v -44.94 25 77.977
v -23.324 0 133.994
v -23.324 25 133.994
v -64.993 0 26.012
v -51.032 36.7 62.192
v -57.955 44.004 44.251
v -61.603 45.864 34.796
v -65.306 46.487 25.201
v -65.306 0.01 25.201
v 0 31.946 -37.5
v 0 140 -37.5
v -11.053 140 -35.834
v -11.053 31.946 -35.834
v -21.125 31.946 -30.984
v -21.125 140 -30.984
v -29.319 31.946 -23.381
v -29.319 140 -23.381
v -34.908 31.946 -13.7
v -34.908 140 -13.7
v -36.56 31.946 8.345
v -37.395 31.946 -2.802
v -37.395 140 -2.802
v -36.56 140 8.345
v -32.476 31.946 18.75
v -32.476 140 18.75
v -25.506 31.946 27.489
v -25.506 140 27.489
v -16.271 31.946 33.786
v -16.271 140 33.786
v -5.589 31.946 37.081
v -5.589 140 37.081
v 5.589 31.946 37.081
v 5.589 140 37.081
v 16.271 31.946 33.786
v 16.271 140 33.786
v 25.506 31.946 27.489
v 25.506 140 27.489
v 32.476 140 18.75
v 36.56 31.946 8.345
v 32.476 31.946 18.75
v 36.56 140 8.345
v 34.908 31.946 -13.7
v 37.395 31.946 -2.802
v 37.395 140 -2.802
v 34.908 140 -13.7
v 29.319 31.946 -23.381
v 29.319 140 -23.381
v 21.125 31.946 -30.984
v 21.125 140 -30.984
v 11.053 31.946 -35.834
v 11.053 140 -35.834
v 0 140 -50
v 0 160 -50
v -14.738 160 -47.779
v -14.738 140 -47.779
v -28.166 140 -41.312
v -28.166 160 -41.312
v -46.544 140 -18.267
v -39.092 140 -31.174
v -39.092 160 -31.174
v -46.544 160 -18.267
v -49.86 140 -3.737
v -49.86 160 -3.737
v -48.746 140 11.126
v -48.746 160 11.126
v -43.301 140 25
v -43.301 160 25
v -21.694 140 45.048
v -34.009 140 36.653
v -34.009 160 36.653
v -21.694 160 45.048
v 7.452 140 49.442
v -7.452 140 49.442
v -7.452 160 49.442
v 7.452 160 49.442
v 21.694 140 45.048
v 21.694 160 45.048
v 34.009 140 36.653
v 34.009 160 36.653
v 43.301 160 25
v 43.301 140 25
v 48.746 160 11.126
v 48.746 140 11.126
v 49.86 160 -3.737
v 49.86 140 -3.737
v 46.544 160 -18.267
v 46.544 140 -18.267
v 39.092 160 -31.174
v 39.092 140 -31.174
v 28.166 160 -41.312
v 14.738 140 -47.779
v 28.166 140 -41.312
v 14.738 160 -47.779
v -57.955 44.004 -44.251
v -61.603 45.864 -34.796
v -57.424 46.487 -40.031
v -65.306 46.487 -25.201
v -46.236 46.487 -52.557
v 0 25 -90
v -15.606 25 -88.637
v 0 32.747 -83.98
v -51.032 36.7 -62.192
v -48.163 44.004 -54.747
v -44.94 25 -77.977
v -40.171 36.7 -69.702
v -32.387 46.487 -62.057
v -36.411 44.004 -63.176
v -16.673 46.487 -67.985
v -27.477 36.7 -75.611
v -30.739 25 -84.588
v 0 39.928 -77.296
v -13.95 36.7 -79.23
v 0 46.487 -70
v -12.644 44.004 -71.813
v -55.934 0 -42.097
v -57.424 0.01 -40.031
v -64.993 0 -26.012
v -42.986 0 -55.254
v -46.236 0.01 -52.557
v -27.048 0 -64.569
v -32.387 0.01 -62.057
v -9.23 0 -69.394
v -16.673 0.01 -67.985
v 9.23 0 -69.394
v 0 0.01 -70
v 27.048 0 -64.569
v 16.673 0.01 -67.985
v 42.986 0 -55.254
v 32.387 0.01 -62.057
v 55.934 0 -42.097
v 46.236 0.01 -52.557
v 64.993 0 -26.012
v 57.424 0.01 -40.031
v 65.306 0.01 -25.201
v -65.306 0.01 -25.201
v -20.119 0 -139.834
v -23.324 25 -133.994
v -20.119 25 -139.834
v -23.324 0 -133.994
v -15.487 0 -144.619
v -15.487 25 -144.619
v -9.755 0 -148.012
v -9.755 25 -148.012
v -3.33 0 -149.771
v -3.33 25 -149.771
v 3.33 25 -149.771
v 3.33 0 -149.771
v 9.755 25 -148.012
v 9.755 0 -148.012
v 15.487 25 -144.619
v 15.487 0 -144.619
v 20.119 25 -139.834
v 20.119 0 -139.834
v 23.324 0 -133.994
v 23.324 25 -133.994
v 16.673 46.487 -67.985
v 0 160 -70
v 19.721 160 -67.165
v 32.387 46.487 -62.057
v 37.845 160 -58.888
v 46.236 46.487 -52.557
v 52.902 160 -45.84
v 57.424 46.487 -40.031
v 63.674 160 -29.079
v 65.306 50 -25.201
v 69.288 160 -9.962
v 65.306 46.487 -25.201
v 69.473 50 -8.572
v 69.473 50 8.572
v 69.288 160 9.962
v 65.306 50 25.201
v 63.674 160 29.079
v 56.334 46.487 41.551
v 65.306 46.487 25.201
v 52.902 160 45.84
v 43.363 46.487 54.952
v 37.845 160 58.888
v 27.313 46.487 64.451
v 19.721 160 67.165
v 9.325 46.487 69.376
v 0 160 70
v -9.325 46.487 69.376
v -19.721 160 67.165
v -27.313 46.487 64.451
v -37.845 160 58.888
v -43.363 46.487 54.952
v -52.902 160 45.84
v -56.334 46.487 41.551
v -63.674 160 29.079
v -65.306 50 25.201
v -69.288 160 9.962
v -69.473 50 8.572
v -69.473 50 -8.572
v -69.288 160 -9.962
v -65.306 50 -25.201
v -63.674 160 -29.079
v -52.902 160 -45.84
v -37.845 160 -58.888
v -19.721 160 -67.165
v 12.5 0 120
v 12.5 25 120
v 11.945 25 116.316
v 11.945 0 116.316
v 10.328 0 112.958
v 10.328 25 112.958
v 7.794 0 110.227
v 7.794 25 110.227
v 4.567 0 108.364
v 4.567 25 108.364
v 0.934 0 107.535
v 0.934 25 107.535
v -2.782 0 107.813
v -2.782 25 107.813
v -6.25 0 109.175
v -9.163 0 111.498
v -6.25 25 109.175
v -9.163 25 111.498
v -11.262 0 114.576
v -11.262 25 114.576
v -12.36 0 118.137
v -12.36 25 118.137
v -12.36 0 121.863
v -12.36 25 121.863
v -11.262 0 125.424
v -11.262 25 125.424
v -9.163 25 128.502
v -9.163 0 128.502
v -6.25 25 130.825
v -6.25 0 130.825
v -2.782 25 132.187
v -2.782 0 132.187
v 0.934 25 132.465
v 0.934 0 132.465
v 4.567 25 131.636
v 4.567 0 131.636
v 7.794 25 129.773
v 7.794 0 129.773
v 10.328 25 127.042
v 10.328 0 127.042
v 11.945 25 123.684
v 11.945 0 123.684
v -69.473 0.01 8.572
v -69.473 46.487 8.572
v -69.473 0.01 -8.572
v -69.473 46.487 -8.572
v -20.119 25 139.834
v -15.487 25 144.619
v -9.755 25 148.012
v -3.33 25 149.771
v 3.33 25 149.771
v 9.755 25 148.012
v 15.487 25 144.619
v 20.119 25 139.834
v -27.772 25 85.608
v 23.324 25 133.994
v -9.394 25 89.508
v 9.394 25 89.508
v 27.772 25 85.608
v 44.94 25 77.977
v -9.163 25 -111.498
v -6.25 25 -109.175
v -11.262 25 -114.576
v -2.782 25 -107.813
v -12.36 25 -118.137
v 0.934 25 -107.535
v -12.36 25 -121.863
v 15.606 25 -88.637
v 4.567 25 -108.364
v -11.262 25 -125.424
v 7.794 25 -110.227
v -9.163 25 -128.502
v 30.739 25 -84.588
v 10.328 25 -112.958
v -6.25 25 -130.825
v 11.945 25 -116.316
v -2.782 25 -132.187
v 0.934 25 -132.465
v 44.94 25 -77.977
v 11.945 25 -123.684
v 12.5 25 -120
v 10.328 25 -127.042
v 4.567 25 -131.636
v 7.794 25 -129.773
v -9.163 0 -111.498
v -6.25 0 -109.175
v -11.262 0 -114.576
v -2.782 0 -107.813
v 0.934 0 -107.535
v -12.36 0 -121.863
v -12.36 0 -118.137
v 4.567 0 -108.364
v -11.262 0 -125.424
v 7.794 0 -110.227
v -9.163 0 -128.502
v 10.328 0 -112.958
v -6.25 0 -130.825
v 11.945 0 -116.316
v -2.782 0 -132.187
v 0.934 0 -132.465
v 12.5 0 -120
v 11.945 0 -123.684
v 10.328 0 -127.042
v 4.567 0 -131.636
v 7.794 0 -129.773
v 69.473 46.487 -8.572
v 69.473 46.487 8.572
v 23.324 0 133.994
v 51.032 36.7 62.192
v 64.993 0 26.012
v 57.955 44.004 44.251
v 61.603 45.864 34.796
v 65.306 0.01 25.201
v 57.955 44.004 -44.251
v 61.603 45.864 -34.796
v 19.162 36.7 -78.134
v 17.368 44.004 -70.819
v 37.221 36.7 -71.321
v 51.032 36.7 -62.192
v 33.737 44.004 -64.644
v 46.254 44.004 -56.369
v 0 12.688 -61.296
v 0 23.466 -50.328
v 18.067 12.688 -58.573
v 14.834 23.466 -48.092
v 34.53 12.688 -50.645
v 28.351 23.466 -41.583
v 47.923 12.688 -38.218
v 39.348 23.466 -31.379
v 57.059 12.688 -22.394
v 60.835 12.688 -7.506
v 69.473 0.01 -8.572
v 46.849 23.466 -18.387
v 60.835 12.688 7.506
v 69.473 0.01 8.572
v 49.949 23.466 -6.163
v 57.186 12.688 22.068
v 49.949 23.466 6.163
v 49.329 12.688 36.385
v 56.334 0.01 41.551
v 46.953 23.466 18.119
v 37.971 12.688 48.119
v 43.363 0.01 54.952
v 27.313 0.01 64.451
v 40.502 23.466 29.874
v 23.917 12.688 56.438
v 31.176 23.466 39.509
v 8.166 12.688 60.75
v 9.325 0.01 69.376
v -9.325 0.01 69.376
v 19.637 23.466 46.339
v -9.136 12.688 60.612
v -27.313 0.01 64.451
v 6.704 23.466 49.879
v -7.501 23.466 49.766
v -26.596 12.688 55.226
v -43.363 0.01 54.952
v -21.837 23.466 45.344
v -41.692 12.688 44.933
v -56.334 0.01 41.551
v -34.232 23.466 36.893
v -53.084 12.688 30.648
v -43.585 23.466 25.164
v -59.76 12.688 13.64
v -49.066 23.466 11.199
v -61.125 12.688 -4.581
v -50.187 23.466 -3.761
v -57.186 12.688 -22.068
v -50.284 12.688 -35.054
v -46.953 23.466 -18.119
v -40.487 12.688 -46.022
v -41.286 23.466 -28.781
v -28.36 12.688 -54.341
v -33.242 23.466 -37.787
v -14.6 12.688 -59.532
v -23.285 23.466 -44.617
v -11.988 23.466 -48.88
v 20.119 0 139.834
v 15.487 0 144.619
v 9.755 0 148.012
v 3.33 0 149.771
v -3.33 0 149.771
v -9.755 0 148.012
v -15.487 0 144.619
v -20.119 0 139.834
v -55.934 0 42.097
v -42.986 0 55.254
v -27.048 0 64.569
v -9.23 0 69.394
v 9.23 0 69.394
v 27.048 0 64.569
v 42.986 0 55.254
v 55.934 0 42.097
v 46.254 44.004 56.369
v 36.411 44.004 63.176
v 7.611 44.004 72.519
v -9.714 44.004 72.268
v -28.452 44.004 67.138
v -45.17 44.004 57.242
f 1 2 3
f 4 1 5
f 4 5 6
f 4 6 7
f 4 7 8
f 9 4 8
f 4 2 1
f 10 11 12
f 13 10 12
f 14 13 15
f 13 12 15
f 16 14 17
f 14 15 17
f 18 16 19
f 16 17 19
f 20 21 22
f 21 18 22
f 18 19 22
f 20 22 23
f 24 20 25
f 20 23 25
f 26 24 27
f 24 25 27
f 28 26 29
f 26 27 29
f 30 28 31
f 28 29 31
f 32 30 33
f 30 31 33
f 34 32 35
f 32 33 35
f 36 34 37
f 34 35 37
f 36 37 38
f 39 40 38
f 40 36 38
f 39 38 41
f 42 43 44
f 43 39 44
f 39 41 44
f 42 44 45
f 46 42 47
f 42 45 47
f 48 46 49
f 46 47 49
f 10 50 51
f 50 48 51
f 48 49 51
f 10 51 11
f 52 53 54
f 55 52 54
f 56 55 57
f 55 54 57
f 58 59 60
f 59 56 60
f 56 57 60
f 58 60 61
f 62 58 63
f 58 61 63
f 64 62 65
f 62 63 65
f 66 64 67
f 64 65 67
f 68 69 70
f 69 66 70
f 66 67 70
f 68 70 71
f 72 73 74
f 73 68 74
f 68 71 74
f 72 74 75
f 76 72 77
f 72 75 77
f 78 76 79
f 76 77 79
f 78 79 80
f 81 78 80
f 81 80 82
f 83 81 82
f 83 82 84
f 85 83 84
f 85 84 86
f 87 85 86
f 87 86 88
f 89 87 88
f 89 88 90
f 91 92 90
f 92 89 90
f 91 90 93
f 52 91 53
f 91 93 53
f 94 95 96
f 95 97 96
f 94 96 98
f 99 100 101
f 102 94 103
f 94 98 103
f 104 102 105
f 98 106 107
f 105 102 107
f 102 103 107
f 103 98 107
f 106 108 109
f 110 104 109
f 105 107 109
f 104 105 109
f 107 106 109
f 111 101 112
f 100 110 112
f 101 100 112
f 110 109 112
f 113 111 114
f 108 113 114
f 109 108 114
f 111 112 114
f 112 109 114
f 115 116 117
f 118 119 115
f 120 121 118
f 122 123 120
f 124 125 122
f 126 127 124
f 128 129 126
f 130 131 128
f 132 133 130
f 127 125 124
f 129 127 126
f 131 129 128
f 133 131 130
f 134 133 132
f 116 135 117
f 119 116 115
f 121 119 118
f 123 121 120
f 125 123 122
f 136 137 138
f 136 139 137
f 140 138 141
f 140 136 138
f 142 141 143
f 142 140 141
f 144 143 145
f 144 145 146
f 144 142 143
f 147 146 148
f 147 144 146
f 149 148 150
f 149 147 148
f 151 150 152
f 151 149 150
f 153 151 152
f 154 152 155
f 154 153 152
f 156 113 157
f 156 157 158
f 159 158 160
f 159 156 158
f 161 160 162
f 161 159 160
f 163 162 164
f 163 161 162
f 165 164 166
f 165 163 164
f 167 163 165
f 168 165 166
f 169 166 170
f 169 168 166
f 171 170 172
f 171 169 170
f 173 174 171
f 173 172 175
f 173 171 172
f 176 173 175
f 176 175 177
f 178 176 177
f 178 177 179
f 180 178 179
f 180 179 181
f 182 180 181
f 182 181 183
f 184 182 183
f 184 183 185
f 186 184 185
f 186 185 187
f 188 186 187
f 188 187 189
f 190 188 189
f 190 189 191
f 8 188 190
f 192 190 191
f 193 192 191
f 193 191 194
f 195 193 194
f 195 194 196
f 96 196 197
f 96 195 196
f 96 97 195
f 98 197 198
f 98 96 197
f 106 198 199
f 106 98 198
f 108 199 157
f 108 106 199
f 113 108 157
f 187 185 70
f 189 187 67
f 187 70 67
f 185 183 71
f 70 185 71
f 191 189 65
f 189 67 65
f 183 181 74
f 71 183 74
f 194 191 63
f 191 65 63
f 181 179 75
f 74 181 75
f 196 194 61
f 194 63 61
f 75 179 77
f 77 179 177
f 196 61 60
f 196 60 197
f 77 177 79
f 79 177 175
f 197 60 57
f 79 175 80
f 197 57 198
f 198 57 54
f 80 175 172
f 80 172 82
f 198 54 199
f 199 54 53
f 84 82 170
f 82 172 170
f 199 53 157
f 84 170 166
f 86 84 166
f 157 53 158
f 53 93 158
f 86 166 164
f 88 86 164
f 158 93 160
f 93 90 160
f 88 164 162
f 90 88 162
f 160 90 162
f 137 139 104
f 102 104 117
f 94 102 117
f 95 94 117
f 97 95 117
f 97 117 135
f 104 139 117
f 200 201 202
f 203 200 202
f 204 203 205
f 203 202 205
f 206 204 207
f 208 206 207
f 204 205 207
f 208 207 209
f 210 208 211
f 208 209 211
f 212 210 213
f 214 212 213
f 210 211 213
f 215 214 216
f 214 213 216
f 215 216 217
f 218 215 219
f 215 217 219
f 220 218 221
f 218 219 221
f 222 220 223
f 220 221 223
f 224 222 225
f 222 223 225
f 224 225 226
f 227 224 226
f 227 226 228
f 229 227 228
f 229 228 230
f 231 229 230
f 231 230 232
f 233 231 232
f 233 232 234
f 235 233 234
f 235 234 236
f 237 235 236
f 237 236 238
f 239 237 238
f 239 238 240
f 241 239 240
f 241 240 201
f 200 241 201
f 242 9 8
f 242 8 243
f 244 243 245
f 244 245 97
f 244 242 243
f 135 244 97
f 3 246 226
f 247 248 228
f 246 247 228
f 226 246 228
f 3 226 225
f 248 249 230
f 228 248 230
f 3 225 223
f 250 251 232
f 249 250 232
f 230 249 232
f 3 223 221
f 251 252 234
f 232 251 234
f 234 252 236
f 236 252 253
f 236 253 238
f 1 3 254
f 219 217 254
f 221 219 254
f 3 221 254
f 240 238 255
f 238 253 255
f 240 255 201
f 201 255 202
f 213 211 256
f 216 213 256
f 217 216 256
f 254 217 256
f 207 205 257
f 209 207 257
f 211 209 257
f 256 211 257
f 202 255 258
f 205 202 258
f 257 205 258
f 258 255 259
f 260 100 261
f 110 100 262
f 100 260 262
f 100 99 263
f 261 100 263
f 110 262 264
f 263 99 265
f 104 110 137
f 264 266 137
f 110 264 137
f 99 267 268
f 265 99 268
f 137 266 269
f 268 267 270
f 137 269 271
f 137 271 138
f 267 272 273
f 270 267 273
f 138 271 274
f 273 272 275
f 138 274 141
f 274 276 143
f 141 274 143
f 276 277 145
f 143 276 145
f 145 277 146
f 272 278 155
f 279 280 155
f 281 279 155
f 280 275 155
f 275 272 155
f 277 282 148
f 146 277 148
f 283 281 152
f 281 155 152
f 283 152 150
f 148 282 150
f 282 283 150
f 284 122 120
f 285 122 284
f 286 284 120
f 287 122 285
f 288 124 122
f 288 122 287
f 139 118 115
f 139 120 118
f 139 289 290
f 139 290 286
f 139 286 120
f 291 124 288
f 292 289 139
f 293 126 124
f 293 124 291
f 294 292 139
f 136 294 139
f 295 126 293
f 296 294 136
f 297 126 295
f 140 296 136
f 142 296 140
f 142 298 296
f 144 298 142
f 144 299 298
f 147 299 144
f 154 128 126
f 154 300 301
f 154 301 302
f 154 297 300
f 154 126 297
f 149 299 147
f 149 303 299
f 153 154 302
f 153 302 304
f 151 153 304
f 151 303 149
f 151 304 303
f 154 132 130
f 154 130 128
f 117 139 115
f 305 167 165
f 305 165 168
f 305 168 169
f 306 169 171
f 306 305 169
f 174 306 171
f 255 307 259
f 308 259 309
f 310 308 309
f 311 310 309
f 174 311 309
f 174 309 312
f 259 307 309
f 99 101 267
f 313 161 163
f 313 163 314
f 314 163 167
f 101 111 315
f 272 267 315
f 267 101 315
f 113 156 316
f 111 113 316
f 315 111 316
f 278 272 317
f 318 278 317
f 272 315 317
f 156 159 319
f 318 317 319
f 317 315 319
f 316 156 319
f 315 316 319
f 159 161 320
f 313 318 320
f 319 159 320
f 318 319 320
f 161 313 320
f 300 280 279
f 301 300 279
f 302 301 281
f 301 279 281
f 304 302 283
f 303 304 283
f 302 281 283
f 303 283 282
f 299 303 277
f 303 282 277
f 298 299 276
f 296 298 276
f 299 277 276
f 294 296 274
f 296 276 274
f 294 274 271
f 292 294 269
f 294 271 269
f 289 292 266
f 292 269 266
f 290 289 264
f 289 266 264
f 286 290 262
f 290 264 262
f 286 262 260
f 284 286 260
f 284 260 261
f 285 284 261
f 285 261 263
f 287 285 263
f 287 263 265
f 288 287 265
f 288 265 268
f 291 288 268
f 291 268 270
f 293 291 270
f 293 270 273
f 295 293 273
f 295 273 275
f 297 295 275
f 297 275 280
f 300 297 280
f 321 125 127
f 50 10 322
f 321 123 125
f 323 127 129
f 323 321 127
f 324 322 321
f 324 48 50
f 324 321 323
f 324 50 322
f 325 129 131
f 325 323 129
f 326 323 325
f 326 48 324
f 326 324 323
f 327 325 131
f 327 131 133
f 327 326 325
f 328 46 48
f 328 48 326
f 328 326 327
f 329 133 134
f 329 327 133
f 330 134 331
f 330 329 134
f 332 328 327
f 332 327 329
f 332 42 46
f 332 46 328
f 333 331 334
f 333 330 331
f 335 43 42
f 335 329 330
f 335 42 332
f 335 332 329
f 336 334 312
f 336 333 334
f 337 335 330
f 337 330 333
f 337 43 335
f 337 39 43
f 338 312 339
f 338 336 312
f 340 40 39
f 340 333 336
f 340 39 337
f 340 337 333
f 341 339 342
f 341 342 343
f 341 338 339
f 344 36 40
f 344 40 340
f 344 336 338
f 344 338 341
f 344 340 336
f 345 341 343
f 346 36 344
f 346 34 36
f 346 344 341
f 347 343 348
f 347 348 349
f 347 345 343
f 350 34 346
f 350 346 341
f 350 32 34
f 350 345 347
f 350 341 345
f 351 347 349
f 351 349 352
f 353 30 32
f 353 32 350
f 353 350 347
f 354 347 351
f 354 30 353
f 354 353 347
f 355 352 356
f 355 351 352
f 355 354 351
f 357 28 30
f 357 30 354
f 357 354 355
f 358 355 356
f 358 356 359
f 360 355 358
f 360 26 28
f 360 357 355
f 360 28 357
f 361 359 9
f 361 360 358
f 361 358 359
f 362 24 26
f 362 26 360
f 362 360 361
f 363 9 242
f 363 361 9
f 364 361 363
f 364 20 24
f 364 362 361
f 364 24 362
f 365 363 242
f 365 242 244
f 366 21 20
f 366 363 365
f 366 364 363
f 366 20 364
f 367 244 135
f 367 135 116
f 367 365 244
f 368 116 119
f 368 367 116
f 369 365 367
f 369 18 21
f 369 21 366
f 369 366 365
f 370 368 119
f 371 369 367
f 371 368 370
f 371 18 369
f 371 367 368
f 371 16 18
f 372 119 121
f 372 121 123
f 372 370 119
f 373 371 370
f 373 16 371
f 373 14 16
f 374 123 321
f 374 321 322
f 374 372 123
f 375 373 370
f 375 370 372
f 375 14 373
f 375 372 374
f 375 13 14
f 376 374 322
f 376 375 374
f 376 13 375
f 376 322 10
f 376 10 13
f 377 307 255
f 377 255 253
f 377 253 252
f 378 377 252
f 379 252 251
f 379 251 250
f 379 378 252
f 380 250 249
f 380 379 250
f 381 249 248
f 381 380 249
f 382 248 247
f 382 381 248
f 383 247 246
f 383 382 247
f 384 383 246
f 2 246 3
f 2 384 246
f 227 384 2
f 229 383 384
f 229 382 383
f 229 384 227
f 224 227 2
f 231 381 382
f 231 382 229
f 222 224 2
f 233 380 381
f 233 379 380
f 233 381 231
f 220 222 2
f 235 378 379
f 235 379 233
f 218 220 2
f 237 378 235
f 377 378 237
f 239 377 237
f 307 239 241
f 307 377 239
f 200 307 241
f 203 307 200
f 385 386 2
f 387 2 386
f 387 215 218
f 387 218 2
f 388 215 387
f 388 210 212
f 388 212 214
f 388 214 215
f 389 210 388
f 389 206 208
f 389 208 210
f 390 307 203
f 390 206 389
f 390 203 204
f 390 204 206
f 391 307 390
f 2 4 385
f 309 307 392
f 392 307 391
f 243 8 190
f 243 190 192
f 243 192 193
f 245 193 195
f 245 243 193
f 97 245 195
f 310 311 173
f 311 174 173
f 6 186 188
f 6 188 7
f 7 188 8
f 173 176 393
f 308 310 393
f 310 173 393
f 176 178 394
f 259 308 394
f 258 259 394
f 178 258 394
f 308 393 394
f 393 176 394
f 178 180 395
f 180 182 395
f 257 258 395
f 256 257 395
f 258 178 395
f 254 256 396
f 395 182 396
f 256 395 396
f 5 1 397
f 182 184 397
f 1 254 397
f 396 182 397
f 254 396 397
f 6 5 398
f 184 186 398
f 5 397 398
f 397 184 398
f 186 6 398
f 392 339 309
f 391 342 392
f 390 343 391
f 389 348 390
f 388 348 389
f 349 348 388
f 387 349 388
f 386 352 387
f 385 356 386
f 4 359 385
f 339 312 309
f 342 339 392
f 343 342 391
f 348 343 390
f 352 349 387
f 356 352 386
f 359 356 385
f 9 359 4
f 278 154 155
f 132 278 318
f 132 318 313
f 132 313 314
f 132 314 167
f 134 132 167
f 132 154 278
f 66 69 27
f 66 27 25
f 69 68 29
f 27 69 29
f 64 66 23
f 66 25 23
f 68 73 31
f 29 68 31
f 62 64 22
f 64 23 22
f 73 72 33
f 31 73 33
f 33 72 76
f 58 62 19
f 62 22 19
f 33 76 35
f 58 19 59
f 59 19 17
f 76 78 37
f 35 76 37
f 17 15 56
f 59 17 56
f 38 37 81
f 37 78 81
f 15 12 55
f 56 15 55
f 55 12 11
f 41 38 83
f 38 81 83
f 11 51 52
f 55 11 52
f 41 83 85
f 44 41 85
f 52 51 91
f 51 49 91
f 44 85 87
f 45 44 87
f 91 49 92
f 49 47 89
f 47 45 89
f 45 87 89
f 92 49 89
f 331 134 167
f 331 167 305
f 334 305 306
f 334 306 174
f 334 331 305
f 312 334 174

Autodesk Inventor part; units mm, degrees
ref_plane "YZ Plane" through (0, 0, 0) normal (1, 0, 0) x (0, 1, 0)
ref_plane "XZ Plane" through (0, 0, 0) normal (0, 1, 0) x (-1, 0, 0)
ref_plane "XY Plane" through (0, 0, 0) normal (0, 0, 1) x (1, 0, 0)
sketch "Sketch1" plane through (0, 0, 0) normal (1, 0, 0) x (0, 1, 0)
  line L0 (119.9441, 0) -> (-107.8442, 0)
  line L1 (140, -37.5) -> (140, -50)
  line L2 (140, -50) -> (160, -50)
  line L3 (160, -50) -> (160, -70)
  line L4 (31.9465, -37.5) -> (140, -37.5)
  line L5 (0, -150) -> (25, -150)
  line L6 (25, -150) -> (25, -90)
  line L7 (0, 154.1092) -> (0, 150) construction
  line L8 (0, -70) -> (0, -195.8423) construction
  line L9 (0, -70) -> (0, -150)
  line L10 (25, -150) -> (25, -90)
  line L11 (160, -70) -> (46.487, -70)
  line L12 (0.0098, -70) -> (0, -70)
  arc A0 (25, -90) -> (46.487, -70) centre (-38.72, 0) ccw
  arc A1 (0, -70.0054) -> (31.9465, -37.5) centre (-38.72, 0) ccw
  point P0 (0, 0)
  point P1 (150, -50)
  point P2 (18.337, -56.0758)
  dimension "d0" = 20
  dimension "d2" = 100
  dimension "d4" = 75
  dimension "d7" = 38.72
  dimension "d8" = 300
  dimension "d9" = 25
  dimension "d10" = 60
  dimension "d11" = 160
  dimension "d12" = 140
revolve "Revolution1" add sketch "Sketch1" angle 360 about axis through (0, 119.9441, 0) along (0, -1, 0) contours L1 L2 L3 L11 A0 L6 L5 L9 A1 L4
sketch "Sketch2" plane through (0, 25, 0) normal (0, 1, 0) x (1, 0, 0)
  circle A0 centre (0, -120) radius 12.5
  arc A1 (-23.3236, -133.9943) -> (23.3236, -133.9943) centre (0, -124.9939) ccw
  line L0 (0, 213.9519) -> (0, -189.1435) construction
  circle A2 centre (0, 0) radius 70
  circle A3 centre (0, 0) radius 70 projected
  line L1 (216.3498, 0) -> (-212.0735, 0)
  circle A4 centre (0, 120) radius 12.5
  arc A5 (23.3236, 133.9943) -> (-23.3236, 133.9943) centre (0, 124.9939) ccw
  line L2 (-23.3236, 133.9943) -> (-65.3062, 25.2012)
  line L3 (-100.3964, -65.731) -> (-103.3588, -73.4078)
  line L4 (-23.3236, -133.9943) -> (-65.3062, -25.2012)
  line L5 (-100.3964, 65.731) -> (-103.3588, 73.4078)
  line L6 (23.3236, 133.9943) -> (65.3062, 25.2012)
  line L7 (100.3964, -65.731) -> (103.3588, -73.4078)
  line L8 (23.3236, -133.9943) -> (65.3062, -25.2012)
  line L9 (100.3964, 65.731) -> (103.3588, 73.4078)
  arc A6 (30.216, -116.1335) -> (30.216, 116.1335) centre (0, 0) ccw
  arc A7 (-30.216, 116.1335) -> (-30.216, -116.1335) centre (0, 0) ccw
  circle A8 centre (0, 0) radius 150.0812
  point P0 (0, -149.9939)
  point P1 (0, -120)
  point P2 (-18.02, -147.7381)
  point P3 (18.02, -147.7381)
  point P4 (-18.02, 147.7381)
  point P5 (18.02, 147.7381)
  dimension "d16" = 25
  dimension "d17" = 50
extrude "Extrusion1" cut sketch "Sketch2" along normal blind 25 and the other way blind 25 contours A0 | A1 L8 A6 L1 A8 A7 L4 | A7 L1 A2 L4 | L8 A2 L1 A6 | L1 A7 L2 A2 | L1 A8 A6 L6 A5 L2 A7 | A2 L6 A6 L1 | A4
properties part number "Quiz1"
